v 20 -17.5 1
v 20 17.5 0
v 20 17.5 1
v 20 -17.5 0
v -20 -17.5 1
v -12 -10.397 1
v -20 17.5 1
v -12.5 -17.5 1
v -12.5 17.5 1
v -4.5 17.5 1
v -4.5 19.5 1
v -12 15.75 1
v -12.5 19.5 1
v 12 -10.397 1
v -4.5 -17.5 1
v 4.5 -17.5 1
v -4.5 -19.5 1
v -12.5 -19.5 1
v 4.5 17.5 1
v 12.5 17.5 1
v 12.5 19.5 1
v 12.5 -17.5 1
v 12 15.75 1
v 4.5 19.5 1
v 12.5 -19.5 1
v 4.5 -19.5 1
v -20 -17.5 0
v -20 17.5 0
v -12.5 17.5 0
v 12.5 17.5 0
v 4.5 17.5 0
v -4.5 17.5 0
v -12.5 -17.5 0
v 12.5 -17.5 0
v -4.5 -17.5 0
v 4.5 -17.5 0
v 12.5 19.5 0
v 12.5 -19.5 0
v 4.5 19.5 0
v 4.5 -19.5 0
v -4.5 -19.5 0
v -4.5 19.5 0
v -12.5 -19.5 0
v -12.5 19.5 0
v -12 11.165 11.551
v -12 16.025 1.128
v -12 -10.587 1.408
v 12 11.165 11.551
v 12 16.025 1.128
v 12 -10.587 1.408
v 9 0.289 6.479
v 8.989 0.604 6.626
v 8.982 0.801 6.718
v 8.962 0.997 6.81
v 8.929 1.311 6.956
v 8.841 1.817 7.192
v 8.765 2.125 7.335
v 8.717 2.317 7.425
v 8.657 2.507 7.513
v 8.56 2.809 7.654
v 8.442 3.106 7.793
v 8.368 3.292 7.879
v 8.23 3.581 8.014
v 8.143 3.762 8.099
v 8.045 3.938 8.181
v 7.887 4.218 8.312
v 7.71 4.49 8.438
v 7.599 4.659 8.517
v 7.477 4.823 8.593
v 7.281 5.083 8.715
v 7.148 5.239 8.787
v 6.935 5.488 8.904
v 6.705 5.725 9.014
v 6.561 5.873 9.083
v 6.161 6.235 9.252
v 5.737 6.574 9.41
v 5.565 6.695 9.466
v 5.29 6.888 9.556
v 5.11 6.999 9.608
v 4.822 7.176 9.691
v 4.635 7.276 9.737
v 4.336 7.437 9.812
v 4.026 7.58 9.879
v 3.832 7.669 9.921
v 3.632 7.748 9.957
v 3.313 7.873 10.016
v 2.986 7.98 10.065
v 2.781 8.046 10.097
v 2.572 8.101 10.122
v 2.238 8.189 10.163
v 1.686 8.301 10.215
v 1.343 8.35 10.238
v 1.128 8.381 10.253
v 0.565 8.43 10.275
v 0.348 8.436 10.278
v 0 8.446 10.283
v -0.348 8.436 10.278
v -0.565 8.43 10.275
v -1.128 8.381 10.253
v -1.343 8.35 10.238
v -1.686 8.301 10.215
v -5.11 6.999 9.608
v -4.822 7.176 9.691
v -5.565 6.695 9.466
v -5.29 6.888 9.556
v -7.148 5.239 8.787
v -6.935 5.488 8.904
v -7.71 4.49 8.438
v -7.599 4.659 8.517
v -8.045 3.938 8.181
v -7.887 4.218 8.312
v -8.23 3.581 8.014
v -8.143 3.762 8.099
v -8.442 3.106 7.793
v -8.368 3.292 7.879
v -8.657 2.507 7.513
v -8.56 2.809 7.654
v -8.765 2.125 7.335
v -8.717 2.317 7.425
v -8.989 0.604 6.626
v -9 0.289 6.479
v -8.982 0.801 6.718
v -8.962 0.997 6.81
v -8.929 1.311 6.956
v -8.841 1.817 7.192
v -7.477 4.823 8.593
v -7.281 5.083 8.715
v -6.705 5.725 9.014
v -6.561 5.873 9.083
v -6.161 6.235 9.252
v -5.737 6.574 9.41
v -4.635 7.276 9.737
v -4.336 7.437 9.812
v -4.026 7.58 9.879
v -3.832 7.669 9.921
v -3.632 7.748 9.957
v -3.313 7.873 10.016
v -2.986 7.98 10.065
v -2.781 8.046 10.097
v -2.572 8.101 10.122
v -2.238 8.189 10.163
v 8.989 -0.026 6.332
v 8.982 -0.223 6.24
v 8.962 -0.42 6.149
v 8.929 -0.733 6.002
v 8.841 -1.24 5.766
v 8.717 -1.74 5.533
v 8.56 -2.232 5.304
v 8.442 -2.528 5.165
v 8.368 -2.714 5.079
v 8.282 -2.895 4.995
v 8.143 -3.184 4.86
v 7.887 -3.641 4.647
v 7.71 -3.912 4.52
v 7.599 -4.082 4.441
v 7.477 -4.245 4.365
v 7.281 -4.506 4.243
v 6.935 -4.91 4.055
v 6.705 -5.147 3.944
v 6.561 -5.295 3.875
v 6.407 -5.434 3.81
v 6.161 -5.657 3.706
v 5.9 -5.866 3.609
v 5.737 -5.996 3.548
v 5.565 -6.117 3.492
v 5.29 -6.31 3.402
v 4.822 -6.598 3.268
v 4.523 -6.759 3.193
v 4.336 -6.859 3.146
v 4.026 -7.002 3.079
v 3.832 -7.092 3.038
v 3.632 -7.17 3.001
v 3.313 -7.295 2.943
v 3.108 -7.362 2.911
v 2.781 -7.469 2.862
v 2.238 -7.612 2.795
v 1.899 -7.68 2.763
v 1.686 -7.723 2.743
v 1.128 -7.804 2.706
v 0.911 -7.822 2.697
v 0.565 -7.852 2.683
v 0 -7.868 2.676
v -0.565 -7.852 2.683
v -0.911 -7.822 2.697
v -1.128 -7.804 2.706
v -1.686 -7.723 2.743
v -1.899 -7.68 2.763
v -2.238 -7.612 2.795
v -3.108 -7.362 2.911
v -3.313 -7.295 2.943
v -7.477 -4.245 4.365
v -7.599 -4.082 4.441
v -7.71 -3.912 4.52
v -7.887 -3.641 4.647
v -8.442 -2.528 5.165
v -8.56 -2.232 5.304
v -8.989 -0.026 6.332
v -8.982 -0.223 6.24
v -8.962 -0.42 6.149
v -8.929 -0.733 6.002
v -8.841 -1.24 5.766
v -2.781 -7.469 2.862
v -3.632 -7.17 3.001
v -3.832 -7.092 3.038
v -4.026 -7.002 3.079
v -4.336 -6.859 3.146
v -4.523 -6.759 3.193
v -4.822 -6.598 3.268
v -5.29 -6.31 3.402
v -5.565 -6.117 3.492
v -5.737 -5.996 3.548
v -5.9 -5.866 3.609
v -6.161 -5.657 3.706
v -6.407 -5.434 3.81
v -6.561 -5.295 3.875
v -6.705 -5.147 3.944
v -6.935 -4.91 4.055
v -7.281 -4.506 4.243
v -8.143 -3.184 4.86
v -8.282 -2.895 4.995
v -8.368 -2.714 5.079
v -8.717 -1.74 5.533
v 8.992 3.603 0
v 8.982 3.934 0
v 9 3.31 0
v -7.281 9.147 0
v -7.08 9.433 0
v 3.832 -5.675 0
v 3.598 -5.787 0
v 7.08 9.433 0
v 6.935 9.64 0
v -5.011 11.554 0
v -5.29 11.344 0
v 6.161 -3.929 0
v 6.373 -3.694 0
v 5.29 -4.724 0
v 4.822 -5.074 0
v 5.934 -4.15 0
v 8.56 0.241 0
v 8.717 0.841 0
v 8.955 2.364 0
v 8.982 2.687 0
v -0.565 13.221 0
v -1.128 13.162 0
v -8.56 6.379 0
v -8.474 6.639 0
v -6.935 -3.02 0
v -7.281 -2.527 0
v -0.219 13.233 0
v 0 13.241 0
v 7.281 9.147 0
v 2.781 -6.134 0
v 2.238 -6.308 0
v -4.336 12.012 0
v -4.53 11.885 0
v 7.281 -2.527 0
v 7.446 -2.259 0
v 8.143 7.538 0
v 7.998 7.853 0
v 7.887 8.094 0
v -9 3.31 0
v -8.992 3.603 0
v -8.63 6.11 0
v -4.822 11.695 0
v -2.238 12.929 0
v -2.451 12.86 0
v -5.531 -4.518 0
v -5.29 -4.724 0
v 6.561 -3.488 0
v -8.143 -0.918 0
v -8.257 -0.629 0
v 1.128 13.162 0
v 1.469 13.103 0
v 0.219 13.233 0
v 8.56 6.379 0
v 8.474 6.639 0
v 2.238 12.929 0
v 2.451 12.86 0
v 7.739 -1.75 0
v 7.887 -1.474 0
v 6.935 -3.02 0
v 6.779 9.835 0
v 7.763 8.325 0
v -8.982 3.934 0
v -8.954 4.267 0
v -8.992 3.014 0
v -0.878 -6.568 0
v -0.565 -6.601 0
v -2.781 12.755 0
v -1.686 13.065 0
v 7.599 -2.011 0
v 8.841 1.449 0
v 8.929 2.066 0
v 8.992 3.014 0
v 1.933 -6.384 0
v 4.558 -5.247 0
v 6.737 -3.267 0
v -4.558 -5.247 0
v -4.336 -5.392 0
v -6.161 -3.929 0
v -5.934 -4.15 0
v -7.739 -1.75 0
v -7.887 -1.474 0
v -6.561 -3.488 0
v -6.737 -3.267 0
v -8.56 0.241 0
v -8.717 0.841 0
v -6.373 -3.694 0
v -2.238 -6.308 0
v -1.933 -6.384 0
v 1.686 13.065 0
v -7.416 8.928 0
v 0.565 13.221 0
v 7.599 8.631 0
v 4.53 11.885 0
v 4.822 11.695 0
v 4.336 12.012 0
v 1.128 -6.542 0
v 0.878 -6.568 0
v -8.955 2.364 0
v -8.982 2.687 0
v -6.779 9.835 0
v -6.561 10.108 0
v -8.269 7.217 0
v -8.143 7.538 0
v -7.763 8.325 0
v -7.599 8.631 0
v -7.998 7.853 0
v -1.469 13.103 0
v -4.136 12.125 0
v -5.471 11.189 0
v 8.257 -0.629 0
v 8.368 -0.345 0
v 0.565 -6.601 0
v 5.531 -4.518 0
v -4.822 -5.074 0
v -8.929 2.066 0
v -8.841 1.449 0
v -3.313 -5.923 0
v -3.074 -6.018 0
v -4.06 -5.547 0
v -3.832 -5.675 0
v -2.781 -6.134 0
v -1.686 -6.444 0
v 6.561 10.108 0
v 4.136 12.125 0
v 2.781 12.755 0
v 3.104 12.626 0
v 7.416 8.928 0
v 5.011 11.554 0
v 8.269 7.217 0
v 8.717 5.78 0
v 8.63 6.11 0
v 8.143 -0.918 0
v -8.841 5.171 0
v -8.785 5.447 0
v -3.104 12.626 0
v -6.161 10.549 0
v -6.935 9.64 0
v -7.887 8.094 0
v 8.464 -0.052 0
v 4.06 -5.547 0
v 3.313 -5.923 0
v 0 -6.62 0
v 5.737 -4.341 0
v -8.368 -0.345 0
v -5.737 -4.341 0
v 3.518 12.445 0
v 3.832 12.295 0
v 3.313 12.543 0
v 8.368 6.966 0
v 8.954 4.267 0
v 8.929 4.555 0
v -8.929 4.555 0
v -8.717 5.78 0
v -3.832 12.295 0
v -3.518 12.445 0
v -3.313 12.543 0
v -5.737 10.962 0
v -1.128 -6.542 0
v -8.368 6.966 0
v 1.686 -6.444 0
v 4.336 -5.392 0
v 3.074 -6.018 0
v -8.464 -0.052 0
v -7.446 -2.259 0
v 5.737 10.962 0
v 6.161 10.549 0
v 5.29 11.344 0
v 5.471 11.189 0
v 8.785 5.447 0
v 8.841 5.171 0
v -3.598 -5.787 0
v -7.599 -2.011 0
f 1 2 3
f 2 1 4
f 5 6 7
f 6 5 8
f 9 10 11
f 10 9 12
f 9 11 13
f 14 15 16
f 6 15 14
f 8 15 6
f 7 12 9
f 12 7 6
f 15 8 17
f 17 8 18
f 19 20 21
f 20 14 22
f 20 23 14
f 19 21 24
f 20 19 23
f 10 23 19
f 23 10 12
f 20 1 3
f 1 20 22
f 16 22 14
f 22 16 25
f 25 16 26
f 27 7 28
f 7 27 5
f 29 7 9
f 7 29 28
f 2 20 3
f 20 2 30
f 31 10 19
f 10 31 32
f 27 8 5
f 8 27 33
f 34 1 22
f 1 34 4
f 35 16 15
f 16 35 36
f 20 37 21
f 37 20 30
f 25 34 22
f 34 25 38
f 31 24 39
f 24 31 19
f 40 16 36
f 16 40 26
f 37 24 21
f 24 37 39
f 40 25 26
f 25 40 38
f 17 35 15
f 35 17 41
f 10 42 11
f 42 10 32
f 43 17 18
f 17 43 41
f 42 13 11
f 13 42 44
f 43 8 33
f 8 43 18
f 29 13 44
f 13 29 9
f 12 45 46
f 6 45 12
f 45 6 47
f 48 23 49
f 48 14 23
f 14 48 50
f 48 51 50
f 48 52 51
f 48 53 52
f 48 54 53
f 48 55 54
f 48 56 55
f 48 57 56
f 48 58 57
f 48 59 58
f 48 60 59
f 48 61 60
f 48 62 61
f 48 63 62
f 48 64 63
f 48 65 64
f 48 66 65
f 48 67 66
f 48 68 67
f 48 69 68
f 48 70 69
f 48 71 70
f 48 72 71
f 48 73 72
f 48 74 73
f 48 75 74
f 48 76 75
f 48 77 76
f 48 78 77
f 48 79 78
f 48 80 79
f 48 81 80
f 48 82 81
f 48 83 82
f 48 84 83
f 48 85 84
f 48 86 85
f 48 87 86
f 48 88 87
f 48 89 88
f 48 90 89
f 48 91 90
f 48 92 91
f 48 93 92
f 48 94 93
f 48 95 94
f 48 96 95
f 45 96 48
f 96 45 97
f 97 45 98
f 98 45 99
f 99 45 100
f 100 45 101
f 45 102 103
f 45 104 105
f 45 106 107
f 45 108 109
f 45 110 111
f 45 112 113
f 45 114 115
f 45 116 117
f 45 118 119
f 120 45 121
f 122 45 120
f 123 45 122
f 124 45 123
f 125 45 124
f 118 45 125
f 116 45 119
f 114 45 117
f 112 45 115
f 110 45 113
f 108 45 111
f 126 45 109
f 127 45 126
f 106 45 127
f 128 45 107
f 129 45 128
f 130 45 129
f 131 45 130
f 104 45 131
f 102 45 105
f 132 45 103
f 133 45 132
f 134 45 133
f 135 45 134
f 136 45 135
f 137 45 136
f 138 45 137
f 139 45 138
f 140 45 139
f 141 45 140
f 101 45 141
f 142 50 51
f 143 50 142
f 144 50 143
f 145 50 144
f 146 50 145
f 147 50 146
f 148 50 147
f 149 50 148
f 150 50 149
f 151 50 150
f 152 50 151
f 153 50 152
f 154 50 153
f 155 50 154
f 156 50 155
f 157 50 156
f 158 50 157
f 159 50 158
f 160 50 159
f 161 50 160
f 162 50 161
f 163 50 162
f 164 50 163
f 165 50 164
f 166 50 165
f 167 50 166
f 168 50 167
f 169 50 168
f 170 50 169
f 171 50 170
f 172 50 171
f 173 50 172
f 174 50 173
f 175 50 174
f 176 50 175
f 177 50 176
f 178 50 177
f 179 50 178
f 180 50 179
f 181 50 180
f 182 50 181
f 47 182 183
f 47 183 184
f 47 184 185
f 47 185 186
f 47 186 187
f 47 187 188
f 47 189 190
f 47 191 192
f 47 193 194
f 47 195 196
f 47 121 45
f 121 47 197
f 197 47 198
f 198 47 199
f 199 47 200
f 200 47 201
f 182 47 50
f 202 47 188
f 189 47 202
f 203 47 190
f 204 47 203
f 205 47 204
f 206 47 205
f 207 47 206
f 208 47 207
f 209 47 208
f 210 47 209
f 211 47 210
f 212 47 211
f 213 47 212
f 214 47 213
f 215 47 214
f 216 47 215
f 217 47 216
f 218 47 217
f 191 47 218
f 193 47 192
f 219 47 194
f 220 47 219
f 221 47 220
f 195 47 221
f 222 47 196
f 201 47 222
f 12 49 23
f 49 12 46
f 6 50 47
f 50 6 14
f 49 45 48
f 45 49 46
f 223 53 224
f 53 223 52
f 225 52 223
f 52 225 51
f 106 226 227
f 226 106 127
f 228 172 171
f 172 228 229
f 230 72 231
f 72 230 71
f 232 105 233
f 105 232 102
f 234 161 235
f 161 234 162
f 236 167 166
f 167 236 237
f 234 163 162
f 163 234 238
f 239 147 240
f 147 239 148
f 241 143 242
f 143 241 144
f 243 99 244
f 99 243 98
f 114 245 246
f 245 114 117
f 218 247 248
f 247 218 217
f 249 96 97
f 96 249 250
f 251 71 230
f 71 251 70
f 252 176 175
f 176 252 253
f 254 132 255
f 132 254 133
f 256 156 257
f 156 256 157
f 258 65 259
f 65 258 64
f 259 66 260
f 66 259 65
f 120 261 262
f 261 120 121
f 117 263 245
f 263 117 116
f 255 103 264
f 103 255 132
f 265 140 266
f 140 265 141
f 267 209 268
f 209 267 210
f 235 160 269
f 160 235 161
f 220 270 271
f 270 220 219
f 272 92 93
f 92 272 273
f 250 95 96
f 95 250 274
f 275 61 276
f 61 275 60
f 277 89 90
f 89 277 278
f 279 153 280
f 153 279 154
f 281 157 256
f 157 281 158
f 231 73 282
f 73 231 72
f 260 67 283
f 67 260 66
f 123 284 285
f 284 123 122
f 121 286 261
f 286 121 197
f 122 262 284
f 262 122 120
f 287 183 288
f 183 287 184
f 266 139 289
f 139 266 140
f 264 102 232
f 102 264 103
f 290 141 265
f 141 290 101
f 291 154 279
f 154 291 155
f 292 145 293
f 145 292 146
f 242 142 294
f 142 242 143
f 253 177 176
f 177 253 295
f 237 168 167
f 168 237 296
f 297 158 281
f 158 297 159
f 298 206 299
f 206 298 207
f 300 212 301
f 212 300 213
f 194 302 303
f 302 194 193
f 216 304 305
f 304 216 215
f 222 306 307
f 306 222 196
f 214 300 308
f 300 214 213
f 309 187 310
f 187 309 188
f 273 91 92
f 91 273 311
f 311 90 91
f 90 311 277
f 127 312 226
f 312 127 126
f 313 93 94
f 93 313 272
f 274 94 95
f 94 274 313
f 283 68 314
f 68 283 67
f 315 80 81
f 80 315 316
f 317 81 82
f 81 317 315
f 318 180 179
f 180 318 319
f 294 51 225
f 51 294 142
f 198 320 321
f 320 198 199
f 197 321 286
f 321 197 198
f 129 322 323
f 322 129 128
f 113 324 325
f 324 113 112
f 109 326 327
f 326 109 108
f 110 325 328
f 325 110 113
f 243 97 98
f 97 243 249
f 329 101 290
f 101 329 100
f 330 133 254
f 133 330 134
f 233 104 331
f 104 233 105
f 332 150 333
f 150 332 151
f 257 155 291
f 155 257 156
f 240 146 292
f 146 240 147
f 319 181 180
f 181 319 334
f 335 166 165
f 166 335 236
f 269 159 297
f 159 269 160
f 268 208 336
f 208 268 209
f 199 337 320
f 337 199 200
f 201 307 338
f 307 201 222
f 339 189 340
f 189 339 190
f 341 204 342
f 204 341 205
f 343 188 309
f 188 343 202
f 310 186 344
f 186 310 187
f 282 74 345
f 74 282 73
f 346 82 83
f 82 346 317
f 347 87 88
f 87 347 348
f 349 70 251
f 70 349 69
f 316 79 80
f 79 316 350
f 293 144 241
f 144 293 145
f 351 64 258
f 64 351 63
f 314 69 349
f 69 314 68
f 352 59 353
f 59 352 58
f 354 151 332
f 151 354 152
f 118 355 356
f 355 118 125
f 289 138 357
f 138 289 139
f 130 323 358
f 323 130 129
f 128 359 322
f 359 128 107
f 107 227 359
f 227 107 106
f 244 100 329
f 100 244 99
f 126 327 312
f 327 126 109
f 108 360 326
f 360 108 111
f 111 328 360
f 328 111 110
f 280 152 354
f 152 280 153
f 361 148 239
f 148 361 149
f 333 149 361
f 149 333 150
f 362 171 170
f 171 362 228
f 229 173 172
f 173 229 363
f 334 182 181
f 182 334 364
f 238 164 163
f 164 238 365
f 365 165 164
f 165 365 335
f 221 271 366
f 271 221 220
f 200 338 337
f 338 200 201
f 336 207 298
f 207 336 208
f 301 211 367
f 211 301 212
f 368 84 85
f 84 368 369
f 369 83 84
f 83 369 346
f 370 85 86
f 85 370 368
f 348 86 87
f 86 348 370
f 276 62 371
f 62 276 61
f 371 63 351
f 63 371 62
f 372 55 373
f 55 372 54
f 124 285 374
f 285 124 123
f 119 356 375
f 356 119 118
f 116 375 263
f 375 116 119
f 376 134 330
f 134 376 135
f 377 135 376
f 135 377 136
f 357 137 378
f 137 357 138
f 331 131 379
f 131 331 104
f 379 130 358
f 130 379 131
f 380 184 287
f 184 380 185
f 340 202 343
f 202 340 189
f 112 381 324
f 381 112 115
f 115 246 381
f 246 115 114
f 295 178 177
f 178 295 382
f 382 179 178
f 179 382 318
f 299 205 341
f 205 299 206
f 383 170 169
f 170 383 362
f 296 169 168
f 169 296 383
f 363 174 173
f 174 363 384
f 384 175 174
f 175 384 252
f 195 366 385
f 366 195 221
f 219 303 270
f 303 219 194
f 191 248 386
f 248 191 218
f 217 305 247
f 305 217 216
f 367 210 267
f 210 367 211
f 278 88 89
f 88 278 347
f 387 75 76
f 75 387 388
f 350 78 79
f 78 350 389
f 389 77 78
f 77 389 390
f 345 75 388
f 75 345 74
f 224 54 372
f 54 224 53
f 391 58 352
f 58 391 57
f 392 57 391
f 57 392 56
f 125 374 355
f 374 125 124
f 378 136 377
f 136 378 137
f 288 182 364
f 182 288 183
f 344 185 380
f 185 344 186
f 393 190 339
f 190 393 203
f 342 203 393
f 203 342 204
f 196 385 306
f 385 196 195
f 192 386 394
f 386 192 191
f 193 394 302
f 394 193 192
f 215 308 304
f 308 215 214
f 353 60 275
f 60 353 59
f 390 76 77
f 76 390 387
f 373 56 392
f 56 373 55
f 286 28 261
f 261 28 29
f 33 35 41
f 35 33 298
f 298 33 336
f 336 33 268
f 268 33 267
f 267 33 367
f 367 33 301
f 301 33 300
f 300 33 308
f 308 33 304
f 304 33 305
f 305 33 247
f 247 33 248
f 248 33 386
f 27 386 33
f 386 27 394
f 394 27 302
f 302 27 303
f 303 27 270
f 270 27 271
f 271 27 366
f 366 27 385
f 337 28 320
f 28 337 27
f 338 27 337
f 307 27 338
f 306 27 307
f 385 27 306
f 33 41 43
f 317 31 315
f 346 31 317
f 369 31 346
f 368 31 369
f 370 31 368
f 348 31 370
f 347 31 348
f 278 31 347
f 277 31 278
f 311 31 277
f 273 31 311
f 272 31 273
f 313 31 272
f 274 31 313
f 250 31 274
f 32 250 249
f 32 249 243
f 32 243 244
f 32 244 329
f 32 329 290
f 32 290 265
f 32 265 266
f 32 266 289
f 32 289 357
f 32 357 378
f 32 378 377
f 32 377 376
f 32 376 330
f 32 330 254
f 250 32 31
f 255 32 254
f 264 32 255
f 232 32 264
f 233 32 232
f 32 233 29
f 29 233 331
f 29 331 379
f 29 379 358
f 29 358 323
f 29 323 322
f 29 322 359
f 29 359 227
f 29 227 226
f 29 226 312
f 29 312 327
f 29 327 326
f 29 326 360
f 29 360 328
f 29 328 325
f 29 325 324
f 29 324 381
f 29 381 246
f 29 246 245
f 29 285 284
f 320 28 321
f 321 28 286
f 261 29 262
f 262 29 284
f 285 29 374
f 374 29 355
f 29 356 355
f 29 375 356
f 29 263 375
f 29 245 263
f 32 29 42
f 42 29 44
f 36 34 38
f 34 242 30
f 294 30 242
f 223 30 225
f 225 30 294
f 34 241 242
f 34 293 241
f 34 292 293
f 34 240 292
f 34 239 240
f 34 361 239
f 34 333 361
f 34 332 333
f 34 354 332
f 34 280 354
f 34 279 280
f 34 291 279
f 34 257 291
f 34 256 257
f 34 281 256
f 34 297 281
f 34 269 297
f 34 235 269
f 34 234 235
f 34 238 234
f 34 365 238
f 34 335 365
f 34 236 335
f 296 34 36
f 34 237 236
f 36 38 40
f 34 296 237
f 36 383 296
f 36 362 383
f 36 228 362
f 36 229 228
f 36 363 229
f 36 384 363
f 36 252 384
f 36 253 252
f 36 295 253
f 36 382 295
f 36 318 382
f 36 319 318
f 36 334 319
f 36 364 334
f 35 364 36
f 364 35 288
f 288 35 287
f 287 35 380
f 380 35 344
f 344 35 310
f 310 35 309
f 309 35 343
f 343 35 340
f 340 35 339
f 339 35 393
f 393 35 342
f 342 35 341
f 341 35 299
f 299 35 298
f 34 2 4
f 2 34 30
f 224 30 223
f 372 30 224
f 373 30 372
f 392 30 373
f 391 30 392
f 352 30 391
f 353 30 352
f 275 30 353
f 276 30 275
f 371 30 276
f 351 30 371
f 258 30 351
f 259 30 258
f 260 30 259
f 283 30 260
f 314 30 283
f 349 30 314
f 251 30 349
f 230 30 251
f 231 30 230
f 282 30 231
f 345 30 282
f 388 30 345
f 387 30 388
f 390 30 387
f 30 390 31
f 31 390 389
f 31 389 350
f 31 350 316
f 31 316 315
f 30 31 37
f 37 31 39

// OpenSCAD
$fn=100*1;
//desired angle
angle=25;  // [0:35]
//verical offset of camera
voff=3; //[-4:5,]
//Thickness of angled prortion
setback=10.5; //[-8:20]

tw=8.5*1;
tc=8.5*1;
th=2*1;


difference(){
    union(){
        //Main plate
        cube([40,35,th],center=true);
        //Tabs
        translate([tc,0,0])
         cube([8,39,th],center=true);
        mirror([1, 0, 0])
         translate([tc,0,0])
          cube([8,39,th],center=true);     
        //Angle
        rotate([angle,0,0])
         translate([0,voff,0])
         cube([24,24,12-(11-setback)],center=true);
    }
    
    //cam hole
    rotate([angle,0,0])
     translate([0,voff,0])
      cylinder(h=50,r=9,center=true);
    
    //clean up the front
    translate([-25,-25,-50])
     cube([50,50,50]);
}
